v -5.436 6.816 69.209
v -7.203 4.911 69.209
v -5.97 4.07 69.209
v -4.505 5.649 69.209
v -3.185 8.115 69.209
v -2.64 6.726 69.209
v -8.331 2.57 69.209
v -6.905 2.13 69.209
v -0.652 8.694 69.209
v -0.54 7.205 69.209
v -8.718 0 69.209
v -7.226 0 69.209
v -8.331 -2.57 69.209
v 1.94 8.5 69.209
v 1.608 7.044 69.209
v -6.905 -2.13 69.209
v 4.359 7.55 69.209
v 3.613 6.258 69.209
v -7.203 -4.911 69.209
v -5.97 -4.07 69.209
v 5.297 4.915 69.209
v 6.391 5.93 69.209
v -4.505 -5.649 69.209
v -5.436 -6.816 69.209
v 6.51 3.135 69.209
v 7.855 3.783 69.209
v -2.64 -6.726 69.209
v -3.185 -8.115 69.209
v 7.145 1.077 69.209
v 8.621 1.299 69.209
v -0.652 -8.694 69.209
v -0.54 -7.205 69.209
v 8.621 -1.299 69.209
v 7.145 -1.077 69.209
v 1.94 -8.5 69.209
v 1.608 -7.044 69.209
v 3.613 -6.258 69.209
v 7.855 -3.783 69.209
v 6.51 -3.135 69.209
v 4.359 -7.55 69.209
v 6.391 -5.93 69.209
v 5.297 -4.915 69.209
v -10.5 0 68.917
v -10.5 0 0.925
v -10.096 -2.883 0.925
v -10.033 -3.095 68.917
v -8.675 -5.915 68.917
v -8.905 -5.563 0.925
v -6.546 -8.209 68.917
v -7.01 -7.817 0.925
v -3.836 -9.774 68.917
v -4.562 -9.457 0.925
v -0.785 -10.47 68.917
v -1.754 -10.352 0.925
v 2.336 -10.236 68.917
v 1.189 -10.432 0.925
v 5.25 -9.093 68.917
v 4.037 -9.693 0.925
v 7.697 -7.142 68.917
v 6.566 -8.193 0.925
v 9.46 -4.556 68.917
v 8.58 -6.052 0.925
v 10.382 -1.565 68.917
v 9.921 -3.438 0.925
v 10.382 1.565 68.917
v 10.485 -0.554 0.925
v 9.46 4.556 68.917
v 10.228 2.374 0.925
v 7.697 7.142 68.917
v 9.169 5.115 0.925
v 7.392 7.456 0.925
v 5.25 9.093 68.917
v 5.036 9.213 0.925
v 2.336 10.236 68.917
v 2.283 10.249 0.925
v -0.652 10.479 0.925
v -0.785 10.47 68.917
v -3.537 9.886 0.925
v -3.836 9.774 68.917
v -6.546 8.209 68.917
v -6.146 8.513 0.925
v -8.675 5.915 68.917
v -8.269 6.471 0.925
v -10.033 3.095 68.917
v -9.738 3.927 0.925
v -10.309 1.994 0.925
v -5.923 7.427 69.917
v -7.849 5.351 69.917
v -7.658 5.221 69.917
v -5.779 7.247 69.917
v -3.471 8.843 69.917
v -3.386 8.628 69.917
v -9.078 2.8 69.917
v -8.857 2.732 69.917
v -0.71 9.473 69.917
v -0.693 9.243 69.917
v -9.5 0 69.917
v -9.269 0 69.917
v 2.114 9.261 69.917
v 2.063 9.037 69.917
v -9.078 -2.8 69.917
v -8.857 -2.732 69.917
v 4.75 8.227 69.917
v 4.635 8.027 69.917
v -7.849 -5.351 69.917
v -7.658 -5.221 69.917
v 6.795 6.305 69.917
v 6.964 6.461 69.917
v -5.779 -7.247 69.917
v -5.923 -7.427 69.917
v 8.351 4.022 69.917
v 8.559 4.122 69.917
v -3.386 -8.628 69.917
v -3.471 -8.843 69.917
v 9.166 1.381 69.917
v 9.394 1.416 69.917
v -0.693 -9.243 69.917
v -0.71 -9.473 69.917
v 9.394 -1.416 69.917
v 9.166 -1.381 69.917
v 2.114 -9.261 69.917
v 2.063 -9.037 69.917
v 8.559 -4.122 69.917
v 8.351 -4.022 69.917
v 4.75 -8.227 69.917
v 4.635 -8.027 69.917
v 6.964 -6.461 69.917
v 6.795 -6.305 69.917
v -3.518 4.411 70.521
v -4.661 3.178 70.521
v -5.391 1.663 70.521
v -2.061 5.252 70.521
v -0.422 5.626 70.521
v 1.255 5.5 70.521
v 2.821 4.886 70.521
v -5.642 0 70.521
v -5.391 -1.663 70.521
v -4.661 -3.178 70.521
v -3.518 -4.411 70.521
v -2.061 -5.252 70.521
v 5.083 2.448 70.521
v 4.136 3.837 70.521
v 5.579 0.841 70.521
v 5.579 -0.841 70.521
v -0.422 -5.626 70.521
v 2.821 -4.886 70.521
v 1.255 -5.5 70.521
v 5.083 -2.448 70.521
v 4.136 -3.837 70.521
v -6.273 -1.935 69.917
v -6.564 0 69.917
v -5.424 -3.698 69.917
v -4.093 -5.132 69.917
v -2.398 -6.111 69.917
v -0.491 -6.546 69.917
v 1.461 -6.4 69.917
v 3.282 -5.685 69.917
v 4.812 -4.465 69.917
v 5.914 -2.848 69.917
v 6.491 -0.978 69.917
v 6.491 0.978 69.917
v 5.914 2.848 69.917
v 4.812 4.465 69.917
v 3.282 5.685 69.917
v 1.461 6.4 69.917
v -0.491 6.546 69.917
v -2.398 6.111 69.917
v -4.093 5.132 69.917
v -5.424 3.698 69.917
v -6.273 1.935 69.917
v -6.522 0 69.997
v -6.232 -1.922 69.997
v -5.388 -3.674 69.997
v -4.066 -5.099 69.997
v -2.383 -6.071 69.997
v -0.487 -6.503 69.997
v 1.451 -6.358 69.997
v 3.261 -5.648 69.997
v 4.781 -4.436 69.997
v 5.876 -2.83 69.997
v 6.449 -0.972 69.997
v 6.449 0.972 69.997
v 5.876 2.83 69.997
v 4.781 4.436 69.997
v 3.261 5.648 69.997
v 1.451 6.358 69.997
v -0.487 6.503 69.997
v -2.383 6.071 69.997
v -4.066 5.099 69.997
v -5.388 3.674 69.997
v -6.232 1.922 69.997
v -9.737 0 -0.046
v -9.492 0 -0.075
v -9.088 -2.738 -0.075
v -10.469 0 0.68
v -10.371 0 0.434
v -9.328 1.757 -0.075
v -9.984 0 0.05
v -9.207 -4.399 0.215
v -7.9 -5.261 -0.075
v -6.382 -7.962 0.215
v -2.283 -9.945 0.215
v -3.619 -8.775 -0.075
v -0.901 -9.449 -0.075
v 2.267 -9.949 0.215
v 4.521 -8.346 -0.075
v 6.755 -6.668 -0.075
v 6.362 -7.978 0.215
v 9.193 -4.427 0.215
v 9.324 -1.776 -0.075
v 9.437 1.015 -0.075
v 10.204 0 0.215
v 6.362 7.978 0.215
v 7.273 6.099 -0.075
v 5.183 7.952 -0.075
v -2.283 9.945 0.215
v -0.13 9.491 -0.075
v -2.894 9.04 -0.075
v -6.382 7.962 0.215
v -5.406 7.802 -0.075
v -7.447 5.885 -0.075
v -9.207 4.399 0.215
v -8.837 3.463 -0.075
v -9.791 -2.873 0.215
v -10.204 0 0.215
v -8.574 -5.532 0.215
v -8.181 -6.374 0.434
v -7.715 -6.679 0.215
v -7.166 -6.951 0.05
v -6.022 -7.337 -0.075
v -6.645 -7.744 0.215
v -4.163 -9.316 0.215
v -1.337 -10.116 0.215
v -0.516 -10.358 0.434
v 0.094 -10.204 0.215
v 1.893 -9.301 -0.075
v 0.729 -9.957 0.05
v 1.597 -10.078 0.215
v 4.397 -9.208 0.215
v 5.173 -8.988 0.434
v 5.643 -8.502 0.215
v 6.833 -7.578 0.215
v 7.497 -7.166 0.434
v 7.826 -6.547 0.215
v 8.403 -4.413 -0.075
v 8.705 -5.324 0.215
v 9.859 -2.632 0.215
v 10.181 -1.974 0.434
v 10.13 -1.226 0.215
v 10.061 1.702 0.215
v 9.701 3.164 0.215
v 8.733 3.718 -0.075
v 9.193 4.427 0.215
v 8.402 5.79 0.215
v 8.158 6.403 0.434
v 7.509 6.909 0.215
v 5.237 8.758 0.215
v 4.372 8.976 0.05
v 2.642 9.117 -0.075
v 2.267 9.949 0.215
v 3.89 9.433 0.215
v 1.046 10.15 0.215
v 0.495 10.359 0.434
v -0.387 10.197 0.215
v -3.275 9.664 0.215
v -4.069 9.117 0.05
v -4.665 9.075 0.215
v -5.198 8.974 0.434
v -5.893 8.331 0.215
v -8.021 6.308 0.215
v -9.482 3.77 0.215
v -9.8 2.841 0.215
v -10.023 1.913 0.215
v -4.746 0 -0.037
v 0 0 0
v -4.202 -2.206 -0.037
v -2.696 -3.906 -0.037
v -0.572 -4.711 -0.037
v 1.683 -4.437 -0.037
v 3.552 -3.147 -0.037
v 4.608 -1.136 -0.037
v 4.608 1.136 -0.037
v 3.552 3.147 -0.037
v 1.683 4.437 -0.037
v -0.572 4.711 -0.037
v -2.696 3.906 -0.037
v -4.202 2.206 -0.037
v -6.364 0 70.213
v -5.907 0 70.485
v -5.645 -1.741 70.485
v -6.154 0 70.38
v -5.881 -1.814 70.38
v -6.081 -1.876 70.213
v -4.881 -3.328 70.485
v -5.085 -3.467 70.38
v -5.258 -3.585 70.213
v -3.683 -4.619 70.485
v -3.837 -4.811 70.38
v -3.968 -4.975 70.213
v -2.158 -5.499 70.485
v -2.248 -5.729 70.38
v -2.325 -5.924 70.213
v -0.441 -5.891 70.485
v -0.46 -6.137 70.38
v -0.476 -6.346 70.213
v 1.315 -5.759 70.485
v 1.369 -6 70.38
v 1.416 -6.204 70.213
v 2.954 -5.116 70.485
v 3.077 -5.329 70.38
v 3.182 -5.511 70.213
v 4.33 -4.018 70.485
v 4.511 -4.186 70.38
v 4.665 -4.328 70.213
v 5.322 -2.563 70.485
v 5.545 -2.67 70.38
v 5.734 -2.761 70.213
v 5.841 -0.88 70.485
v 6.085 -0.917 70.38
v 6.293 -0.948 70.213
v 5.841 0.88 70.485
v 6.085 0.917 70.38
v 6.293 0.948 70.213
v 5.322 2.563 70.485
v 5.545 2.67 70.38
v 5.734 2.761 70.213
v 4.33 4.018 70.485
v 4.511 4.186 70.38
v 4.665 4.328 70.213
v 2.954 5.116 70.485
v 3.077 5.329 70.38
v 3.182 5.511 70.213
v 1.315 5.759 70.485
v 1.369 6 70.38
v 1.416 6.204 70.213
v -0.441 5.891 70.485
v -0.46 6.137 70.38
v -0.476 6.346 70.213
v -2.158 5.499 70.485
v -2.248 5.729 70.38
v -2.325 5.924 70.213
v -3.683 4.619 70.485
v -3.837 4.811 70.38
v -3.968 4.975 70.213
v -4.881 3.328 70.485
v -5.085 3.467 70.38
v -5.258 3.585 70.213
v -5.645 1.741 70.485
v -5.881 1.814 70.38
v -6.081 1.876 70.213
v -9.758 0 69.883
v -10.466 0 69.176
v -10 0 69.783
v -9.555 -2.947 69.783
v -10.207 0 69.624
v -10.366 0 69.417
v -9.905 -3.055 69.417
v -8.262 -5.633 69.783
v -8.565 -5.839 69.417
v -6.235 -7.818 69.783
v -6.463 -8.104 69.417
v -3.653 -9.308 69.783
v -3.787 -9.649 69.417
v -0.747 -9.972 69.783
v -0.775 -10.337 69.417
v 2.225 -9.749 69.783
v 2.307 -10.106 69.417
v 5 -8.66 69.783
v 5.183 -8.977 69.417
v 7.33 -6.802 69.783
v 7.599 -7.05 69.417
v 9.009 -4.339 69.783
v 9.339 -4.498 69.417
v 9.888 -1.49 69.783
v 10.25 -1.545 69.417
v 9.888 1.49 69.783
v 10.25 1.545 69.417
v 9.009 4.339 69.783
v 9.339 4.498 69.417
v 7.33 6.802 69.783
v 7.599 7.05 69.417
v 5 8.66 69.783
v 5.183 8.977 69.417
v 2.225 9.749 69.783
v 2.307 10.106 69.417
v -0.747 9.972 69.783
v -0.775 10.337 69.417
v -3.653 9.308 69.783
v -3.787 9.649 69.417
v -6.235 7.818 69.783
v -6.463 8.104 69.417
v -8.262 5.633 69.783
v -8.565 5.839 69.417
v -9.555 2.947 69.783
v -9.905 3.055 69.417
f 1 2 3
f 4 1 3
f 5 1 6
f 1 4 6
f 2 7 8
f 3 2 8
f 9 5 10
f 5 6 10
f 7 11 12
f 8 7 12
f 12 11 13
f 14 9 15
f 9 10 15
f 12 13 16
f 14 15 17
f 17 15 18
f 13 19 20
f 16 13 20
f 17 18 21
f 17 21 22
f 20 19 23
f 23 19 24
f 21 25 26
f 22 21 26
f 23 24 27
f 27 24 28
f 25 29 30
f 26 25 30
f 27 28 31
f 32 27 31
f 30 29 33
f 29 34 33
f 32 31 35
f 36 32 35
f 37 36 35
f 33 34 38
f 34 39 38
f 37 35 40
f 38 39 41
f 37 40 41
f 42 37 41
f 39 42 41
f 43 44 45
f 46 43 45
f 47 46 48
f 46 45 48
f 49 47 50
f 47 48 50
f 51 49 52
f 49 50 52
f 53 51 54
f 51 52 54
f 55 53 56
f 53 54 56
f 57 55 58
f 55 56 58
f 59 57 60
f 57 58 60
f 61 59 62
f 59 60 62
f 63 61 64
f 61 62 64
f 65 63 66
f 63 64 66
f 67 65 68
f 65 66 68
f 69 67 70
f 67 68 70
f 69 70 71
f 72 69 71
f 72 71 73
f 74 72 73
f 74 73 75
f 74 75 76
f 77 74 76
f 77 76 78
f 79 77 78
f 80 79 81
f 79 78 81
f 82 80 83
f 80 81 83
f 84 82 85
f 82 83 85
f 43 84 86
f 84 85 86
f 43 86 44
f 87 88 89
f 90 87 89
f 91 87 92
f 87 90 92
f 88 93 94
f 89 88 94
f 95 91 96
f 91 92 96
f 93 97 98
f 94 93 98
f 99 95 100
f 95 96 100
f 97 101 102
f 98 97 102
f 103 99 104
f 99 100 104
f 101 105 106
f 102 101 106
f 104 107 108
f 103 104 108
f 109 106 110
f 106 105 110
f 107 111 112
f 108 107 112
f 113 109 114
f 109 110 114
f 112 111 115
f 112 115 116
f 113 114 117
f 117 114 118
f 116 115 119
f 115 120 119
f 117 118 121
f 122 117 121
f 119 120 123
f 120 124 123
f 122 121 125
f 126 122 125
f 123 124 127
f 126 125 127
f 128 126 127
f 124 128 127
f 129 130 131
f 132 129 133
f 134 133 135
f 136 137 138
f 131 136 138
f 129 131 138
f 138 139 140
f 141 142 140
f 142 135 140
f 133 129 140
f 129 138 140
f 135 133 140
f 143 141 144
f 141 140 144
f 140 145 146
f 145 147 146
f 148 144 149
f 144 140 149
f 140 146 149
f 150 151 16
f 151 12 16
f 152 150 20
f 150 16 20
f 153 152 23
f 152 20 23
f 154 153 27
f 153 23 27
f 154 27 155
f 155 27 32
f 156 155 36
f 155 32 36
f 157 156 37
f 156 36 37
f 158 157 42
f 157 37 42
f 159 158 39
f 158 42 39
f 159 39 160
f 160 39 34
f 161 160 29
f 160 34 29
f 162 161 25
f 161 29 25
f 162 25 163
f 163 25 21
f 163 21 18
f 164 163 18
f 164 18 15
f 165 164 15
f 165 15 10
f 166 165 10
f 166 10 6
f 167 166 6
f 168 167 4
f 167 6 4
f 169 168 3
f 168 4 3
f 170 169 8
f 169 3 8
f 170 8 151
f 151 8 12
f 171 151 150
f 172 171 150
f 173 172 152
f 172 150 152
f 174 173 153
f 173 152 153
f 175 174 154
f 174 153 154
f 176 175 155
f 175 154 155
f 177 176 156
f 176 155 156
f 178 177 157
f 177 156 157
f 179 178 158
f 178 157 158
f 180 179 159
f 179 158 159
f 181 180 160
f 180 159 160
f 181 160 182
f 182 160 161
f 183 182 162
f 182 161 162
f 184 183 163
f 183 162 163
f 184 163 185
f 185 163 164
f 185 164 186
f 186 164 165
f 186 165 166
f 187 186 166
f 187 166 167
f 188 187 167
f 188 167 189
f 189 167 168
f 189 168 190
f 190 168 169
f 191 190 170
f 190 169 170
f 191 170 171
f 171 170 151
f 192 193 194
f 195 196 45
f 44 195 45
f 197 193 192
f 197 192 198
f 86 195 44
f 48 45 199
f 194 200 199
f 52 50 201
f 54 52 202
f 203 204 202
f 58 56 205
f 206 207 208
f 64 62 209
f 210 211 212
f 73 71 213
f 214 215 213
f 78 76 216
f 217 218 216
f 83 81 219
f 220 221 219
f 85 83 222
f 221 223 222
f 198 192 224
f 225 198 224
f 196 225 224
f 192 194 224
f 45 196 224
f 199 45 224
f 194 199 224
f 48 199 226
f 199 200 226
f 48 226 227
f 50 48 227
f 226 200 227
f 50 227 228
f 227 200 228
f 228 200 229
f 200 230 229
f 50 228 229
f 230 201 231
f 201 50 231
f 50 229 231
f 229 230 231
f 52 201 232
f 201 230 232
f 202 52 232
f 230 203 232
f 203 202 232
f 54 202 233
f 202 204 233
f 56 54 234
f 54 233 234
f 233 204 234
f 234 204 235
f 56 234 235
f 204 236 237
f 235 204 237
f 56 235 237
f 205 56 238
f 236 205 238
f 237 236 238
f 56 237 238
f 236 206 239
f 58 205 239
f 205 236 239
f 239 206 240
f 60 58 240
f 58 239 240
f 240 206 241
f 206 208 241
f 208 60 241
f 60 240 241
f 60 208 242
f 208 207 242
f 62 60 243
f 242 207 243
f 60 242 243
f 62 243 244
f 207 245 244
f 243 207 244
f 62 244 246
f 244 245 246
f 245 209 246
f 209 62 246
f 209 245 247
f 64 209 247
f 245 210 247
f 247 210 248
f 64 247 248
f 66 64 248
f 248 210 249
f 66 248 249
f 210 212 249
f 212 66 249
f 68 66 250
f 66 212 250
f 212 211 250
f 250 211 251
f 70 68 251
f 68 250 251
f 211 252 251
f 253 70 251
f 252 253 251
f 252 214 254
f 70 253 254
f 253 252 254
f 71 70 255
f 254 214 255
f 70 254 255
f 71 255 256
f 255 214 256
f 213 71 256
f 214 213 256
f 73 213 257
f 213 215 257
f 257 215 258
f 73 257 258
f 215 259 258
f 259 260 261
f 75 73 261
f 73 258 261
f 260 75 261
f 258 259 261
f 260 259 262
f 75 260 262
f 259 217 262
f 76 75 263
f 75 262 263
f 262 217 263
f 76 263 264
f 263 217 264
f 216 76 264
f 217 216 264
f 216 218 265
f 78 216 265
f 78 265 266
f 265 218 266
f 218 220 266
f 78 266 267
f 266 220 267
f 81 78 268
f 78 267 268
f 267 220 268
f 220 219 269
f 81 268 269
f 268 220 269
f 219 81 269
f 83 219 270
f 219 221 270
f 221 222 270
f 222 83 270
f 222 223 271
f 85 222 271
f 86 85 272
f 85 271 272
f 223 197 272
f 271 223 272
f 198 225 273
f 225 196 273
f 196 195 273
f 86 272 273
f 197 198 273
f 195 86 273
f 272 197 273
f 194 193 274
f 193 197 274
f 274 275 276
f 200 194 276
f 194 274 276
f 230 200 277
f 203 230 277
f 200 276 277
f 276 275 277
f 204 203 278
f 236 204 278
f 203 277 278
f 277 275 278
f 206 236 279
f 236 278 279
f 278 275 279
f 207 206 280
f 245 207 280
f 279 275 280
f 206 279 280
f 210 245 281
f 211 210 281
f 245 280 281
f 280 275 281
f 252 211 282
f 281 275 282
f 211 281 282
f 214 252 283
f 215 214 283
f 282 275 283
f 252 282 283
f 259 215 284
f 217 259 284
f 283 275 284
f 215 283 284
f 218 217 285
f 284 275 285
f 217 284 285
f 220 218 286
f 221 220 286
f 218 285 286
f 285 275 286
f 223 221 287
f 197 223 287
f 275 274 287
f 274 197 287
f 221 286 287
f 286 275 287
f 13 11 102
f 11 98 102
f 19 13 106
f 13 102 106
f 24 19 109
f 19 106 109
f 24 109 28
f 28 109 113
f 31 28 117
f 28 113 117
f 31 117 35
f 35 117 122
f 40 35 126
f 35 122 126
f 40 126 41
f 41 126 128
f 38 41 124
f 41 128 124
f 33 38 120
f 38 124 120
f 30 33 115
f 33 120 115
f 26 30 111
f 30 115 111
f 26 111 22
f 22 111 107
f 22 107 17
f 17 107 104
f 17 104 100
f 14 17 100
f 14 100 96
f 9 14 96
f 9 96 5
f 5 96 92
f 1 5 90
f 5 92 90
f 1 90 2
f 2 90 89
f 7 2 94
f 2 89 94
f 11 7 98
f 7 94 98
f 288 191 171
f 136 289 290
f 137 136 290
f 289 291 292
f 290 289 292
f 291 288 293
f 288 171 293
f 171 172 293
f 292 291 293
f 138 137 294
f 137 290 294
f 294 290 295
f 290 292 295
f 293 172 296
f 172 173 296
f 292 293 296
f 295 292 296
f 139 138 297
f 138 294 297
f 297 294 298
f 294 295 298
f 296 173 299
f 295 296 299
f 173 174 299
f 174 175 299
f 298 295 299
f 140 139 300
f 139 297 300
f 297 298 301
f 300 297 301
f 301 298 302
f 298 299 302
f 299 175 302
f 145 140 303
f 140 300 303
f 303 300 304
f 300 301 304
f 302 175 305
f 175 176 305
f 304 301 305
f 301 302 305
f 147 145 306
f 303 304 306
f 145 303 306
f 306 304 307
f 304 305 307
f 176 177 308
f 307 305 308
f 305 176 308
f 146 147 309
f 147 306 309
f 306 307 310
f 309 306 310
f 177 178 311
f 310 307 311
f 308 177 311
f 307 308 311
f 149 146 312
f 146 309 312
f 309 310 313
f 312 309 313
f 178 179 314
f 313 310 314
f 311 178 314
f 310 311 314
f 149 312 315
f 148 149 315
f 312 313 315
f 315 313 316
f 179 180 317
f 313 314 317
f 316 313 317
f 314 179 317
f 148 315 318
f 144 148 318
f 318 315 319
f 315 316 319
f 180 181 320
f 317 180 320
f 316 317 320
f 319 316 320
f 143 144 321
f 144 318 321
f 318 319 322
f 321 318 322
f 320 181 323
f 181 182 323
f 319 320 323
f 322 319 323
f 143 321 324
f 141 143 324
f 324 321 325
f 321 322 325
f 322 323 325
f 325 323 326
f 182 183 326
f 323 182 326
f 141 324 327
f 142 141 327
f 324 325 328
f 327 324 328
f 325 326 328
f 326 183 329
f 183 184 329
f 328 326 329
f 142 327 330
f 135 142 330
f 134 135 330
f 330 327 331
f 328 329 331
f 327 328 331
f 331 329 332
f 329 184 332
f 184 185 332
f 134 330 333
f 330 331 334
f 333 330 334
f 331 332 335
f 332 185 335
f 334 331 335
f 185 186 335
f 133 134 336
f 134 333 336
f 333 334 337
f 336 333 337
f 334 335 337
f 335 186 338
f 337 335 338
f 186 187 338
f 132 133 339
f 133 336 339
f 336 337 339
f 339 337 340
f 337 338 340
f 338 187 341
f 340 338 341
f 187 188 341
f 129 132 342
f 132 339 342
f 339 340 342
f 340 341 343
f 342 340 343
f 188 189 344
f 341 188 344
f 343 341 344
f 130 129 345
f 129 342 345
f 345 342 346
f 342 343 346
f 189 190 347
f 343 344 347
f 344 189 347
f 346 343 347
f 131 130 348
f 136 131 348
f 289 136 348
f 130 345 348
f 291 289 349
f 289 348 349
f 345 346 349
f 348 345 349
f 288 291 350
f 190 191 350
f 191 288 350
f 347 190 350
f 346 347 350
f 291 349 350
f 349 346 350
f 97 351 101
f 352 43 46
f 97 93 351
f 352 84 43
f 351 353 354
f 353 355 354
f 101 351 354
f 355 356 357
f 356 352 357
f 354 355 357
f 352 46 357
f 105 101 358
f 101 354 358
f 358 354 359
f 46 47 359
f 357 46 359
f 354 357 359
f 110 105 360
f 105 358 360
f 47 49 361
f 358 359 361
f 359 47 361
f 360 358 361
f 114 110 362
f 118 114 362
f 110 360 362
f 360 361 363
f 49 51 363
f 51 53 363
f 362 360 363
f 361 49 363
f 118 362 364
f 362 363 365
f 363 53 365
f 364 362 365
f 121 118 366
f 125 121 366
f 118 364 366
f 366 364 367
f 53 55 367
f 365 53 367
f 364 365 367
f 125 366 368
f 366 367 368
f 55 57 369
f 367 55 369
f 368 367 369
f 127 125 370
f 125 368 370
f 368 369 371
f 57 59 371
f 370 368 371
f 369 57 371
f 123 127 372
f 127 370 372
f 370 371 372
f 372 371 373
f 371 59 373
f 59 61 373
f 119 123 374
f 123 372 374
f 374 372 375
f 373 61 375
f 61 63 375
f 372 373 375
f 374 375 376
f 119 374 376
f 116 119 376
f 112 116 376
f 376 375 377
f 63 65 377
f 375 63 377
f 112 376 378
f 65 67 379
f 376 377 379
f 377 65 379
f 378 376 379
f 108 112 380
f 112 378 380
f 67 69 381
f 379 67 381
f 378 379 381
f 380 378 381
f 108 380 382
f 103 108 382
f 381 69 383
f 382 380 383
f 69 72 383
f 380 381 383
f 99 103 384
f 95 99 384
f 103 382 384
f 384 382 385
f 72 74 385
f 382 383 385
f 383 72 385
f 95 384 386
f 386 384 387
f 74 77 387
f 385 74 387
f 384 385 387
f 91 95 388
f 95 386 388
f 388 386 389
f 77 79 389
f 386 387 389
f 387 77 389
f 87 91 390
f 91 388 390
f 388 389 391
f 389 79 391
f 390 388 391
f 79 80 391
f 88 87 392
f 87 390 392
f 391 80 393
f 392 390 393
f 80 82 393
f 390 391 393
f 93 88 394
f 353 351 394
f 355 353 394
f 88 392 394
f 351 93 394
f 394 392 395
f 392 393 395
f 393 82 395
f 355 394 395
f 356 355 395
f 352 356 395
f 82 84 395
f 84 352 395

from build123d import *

# Parameters (mm, degrees)
F2_R = 1


# Not quite as in the source:
# - two fillets or chamfers of one size are made in one step


with BuildPart() as f1:
    # F0 (on Front) → F1 (revolve)
    with BuildSketch(Plane.XZ):
        Polygon((-10.4996741857, -0.0827163458), (0, 0), (0, 69.9172836542), (0, 70.5213546753), (-6.2381645857, 70.5213546753), (-6.5643620988, 69.9172836542), (-7.2255664847, 69.2085400224), (-8.7180831586, 69.2085400224), (-9.2690859436, 69.9172836542), (-10.4996741857, 69.9172836542), align=None)
    revolve(axis=Axis((0, 0, 34.9586418271), (0, 0, 1)))

    # F2
    f2_edges = [f1.edges().sort_by_distance(p)[0] for p in [
        (10.499674, 0, -0.082716),
        (6.238165, 0, 70.521355),
        (10.499674, 0, 69.917284),
    ]]
    fillet(f2_edges, radius=F2_R)


solid = f1.part
